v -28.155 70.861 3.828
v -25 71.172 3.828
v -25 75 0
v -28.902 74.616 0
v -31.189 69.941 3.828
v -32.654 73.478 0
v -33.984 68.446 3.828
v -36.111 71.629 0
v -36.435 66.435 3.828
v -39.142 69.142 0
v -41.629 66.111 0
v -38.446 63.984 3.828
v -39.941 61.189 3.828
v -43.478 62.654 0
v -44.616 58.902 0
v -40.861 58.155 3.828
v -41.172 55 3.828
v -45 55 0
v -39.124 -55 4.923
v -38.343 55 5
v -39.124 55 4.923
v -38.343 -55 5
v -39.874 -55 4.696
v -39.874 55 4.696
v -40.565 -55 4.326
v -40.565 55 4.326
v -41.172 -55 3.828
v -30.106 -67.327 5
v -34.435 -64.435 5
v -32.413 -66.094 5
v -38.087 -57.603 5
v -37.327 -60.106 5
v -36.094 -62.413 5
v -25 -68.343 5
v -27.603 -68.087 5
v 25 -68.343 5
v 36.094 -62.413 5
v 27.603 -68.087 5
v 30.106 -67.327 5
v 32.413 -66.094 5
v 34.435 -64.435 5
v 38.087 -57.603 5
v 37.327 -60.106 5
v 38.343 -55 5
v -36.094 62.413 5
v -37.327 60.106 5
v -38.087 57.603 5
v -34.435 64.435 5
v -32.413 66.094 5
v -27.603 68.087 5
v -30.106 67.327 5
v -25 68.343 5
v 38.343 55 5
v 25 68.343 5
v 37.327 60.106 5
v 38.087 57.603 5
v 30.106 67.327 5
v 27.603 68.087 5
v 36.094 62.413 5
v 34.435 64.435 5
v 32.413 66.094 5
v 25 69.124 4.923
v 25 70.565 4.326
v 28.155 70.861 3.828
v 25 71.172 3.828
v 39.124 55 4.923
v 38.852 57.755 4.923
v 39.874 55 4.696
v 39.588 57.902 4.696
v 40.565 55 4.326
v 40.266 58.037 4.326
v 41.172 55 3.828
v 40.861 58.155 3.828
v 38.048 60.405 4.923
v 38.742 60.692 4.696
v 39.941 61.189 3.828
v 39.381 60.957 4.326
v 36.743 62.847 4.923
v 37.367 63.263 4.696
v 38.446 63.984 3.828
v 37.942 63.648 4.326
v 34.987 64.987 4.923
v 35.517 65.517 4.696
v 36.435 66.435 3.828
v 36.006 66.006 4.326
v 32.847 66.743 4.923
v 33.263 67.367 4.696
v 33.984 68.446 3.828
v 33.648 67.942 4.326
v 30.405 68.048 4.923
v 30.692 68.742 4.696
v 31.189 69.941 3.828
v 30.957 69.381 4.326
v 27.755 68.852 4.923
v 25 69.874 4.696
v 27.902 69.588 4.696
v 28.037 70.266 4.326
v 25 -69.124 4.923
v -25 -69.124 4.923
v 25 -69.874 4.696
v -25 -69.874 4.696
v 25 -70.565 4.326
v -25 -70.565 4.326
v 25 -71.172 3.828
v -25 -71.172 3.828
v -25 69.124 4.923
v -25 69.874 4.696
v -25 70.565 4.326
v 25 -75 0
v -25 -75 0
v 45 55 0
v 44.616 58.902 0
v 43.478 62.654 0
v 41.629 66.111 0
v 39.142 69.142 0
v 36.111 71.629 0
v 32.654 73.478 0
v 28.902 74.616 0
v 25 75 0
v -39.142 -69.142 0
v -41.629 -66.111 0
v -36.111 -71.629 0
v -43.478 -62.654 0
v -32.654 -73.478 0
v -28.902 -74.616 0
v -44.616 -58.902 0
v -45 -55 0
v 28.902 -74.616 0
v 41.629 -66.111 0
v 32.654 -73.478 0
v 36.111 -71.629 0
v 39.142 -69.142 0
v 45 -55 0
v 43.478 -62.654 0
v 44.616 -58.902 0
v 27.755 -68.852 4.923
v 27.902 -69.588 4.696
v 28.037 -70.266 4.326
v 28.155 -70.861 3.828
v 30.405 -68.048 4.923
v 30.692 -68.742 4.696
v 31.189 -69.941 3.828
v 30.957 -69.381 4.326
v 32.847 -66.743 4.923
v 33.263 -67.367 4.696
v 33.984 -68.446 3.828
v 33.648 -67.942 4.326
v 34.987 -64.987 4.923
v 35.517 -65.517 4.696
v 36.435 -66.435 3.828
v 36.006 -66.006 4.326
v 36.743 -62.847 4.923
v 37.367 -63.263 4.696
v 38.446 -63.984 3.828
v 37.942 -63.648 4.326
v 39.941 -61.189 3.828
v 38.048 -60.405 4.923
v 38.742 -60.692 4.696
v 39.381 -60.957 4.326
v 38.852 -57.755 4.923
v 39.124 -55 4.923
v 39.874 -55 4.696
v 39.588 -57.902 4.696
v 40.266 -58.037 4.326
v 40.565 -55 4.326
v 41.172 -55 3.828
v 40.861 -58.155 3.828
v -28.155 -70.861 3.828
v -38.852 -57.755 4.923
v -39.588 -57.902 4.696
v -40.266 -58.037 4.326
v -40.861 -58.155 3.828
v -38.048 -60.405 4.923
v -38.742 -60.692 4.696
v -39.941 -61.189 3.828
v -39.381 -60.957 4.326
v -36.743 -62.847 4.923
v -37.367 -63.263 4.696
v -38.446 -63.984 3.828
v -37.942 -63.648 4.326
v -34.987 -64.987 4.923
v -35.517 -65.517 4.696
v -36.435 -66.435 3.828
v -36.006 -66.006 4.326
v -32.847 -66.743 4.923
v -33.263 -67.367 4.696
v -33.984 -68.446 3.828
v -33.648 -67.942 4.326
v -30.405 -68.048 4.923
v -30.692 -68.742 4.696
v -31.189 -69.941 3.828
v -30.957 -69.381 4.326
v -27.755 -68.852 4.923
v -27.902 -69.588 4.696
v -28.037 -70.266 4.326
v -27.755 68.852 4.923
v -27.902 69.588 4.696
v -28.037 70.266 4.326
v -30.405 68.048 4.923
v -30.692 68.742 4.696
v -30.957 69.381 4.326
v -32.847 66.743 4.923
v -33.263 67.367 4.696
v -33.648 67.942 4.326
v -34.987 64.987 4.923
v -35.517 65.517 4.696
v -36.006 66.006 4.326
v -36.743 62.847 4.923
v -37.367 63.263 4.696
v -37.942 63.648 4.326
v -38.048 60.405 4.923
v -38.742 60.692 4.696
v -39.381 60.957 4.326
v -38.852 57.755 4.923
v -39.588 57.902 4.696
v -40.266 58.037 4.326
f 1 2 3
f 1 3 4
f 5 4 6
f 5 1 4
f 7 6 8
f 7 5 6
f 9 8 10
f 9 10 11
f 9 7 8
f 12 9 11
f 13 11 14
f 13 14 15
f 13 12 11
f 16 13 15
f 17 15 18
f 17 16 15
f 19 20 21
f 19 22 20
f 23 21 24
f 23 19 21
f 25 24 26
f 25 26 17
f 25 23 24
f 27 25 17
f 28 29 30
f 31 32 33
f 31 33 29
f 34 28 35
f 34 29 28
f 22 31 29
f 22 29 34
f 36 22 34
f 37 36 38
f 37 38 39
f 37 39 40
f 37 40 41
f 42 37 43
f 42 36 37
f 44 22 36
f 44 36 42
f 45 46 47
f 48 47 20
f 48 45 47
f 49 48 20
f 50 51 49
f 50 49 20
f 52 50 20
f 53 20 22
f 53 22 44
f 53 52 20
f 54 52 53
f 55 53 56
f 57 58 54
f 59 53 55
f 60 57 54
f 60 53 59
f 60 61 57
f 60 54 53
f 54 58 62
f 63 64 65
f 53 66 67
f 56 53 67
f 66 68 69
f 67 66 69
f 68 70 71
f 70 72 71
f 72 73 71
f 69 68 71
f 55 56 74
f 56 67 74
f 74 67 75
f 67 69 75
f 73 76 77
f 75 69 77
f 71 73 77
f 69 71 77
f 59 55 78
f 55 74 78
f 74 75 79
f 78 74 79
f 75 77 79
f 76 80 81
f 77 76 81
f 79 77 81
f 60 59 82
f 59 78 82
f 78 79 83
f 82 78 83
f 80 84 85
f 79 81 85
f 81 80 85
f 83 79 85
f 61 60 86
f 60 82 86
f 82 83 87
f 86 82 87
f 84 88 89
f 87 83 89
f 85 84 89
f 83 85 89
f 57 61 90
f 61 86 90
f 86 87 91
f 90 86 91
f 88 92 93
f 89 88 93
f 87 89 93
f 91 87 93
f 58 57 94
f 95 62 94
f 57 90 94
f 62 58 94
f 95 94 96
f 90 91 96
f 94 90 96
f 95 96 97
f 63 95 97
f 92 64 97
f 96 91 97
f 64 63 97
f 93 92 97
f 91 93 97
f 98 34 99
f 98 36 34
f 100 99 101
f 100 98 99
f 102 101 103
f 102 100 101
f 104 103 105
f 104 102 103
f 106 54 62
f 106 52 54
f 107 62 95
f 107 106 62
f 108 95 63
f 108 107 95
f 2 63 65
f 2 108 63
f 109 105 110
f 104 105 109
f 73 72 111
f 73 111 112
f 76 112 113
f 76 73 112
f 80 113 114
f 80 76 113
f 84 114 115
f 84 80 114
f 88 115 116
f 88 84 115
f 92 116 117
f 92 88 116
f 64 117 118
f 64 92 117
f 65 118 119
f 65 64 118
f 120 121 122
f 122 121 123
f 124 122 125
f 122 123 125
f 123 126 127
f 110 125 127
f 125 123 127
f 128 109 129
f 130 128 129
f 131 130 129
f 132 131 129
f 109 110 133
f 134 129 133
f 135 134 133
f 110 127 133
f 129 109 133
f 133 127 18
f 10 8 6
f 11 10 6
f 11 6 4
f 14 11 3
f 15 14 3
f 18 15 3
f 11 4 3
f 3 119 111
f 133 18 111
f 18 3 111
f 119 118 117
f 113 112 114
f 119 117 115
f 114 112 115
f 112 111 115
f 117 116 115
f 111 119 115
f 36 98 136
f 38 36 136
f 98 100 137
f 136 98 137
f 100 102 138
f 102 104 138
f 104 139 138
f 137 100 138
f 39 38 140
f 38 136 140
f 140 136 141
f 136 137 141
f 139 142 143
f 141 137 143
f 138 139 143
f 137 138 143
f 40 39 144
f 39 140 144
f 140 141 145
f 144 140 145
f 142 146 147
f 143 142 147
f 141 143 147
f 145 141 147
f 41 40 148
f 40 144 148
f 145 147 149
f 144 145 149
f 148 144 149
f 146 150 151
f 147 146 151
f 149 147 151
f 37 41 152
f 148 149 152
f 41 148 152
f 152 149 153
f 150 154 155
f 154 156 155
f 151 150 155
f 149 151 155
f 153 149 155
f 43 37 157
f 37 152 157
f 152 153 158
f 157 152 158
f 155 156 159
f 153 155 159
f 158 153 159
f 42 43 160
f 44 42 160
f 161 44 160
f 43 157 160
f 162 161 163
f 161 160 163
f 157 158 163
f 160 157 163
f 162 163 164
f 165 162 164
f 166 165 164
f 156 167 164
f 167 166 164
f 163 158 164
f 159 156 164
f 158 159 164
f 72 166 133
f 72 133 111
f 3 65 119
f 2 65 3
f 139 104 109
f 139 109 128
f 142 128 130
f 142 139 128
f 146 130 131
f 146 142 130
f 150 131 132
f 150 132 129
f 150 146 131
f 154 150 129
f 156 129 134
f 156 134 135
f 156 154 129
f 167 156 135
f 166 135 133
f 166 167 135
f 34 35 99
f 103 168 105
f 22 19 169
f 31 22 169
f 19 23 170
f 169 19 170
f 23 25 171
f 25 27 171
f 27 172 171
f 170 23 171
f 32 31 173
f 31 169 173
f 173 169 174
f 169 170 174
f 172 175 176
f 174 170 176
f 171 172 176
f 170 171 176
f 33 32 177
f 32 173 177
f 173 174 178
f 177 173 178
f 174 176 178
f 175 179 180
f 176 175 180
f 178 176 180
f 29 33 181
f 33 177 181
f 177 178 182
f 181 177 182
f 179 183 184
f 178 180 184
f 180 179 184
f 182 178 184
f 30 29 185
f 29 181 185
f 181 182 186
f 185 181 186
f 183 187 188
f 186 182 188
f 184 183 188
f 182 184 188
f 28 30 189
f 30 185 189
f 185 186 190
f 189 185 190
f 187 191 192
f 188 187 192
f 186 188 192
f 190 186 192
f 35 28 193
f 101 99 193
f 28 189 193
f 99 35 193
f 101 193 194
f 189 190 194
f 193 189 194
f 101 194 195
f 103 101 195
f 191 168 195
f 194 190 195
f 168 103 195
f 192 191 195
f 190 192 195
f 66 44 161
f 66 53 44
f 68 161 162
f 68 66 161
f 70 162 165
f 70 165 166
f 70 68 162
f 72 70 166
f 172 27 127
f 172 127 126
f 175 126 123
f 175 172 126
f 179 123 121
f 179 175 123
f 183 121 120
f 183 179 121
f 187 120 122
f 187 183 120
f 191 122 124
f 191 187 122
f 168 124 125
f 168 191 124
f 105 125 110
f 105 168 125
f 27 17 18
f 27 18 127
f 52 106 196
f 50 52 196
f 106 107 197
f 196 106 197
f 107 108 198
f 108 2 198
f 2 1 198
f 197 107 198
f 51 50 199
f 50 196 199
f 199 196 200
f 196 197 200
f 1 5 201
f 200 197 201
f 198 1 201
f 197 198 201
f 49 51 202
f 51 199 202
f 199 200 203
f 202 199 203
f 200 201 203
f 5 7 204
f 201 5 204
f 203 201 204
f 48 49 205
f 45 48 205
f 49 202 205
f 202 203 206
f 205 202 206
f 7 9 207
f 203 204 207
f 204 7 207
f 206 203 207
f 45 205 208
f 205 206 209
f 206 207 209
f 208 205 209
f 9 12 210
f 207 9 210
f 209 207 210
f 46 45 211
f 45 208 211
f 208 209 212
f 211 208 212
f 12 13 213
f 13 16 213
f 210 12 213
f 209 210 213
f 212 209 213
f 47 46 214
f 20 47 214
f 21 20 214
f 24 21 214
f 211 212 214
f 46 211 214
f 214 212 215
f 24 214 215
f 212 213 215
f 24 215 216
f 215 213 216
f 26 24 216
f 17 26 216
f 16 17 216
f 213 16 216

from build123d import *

# Parameters (mm, degrees)
F1_DEPTH = 5
F2_SIZE  = 4.99999
F3_R     = 4


# Not quite as in the source:
# - a fillet or chamfer is up to 0.001 mm smaller than in the source, because OpenCascade refuses the exact size


with BuildPart() as f1:
    # F0 (on Top) → F1 (new body)
    with BuildSketch(Plane.XY):
        with BuildLine():
            Line((25, 75), (-25, 75))
            ThreePointArc((-25, 75), (-39.1421356237, 69.1421356237), (-45, 55))
            Line((-45, 55), (-45, -55))
            ThreePointArc((-45, -55), (-39.1421356237, -69.1421356237), (-25, -75))
            Line((-25, -75), (25, -75))
            ThreePointArc((25, -75), (39.1421356237, -69.1421356237), (45, -55))
            Line((45, -55), (45, 55))
            ThreePointArc((45, 55), (39.1421356237, 69.1421356237), (25, 75))
        make_face()
    extrude(amount=F1_DEPTH)

    # F2 (size 5 in the source; OpenCascade refuses exactly that, so slightly less here)
    f2_edges = [f1.edges().sort_by_distance(p)[0] for p in [
        (-39.142136, -69.142136, 5),
        (0, -75, 5),
        (39.142136, -69.142136, 5),
        (45, 0, 5),
        (39.142136, 69.142136, 5),
        (0, 75, 5),
        (-39.142136, 69.142136, 5),
        (-45, 0, 5),
    ]]
    chamfer(f2_edges, length=F2_SIZE)

    # F3
    f3_edges = [f1.edges().sort_by_distance(p)[0] for p in [
        (-35.606609, -65.606609, 5),
        (-40.00001, 0, 5),
        (0, -70.00001, 5),
        (-35.606609, 65.606609, 5),
        (35.606609, -65.606609, 5),
        (0, 70.00001, 5),
        (40.00001, 0, 5),
        (35.606609, 65.606609, 5),
    ]]
    fillet(f3_edges, radius=F3_R)


solid = f1.part
